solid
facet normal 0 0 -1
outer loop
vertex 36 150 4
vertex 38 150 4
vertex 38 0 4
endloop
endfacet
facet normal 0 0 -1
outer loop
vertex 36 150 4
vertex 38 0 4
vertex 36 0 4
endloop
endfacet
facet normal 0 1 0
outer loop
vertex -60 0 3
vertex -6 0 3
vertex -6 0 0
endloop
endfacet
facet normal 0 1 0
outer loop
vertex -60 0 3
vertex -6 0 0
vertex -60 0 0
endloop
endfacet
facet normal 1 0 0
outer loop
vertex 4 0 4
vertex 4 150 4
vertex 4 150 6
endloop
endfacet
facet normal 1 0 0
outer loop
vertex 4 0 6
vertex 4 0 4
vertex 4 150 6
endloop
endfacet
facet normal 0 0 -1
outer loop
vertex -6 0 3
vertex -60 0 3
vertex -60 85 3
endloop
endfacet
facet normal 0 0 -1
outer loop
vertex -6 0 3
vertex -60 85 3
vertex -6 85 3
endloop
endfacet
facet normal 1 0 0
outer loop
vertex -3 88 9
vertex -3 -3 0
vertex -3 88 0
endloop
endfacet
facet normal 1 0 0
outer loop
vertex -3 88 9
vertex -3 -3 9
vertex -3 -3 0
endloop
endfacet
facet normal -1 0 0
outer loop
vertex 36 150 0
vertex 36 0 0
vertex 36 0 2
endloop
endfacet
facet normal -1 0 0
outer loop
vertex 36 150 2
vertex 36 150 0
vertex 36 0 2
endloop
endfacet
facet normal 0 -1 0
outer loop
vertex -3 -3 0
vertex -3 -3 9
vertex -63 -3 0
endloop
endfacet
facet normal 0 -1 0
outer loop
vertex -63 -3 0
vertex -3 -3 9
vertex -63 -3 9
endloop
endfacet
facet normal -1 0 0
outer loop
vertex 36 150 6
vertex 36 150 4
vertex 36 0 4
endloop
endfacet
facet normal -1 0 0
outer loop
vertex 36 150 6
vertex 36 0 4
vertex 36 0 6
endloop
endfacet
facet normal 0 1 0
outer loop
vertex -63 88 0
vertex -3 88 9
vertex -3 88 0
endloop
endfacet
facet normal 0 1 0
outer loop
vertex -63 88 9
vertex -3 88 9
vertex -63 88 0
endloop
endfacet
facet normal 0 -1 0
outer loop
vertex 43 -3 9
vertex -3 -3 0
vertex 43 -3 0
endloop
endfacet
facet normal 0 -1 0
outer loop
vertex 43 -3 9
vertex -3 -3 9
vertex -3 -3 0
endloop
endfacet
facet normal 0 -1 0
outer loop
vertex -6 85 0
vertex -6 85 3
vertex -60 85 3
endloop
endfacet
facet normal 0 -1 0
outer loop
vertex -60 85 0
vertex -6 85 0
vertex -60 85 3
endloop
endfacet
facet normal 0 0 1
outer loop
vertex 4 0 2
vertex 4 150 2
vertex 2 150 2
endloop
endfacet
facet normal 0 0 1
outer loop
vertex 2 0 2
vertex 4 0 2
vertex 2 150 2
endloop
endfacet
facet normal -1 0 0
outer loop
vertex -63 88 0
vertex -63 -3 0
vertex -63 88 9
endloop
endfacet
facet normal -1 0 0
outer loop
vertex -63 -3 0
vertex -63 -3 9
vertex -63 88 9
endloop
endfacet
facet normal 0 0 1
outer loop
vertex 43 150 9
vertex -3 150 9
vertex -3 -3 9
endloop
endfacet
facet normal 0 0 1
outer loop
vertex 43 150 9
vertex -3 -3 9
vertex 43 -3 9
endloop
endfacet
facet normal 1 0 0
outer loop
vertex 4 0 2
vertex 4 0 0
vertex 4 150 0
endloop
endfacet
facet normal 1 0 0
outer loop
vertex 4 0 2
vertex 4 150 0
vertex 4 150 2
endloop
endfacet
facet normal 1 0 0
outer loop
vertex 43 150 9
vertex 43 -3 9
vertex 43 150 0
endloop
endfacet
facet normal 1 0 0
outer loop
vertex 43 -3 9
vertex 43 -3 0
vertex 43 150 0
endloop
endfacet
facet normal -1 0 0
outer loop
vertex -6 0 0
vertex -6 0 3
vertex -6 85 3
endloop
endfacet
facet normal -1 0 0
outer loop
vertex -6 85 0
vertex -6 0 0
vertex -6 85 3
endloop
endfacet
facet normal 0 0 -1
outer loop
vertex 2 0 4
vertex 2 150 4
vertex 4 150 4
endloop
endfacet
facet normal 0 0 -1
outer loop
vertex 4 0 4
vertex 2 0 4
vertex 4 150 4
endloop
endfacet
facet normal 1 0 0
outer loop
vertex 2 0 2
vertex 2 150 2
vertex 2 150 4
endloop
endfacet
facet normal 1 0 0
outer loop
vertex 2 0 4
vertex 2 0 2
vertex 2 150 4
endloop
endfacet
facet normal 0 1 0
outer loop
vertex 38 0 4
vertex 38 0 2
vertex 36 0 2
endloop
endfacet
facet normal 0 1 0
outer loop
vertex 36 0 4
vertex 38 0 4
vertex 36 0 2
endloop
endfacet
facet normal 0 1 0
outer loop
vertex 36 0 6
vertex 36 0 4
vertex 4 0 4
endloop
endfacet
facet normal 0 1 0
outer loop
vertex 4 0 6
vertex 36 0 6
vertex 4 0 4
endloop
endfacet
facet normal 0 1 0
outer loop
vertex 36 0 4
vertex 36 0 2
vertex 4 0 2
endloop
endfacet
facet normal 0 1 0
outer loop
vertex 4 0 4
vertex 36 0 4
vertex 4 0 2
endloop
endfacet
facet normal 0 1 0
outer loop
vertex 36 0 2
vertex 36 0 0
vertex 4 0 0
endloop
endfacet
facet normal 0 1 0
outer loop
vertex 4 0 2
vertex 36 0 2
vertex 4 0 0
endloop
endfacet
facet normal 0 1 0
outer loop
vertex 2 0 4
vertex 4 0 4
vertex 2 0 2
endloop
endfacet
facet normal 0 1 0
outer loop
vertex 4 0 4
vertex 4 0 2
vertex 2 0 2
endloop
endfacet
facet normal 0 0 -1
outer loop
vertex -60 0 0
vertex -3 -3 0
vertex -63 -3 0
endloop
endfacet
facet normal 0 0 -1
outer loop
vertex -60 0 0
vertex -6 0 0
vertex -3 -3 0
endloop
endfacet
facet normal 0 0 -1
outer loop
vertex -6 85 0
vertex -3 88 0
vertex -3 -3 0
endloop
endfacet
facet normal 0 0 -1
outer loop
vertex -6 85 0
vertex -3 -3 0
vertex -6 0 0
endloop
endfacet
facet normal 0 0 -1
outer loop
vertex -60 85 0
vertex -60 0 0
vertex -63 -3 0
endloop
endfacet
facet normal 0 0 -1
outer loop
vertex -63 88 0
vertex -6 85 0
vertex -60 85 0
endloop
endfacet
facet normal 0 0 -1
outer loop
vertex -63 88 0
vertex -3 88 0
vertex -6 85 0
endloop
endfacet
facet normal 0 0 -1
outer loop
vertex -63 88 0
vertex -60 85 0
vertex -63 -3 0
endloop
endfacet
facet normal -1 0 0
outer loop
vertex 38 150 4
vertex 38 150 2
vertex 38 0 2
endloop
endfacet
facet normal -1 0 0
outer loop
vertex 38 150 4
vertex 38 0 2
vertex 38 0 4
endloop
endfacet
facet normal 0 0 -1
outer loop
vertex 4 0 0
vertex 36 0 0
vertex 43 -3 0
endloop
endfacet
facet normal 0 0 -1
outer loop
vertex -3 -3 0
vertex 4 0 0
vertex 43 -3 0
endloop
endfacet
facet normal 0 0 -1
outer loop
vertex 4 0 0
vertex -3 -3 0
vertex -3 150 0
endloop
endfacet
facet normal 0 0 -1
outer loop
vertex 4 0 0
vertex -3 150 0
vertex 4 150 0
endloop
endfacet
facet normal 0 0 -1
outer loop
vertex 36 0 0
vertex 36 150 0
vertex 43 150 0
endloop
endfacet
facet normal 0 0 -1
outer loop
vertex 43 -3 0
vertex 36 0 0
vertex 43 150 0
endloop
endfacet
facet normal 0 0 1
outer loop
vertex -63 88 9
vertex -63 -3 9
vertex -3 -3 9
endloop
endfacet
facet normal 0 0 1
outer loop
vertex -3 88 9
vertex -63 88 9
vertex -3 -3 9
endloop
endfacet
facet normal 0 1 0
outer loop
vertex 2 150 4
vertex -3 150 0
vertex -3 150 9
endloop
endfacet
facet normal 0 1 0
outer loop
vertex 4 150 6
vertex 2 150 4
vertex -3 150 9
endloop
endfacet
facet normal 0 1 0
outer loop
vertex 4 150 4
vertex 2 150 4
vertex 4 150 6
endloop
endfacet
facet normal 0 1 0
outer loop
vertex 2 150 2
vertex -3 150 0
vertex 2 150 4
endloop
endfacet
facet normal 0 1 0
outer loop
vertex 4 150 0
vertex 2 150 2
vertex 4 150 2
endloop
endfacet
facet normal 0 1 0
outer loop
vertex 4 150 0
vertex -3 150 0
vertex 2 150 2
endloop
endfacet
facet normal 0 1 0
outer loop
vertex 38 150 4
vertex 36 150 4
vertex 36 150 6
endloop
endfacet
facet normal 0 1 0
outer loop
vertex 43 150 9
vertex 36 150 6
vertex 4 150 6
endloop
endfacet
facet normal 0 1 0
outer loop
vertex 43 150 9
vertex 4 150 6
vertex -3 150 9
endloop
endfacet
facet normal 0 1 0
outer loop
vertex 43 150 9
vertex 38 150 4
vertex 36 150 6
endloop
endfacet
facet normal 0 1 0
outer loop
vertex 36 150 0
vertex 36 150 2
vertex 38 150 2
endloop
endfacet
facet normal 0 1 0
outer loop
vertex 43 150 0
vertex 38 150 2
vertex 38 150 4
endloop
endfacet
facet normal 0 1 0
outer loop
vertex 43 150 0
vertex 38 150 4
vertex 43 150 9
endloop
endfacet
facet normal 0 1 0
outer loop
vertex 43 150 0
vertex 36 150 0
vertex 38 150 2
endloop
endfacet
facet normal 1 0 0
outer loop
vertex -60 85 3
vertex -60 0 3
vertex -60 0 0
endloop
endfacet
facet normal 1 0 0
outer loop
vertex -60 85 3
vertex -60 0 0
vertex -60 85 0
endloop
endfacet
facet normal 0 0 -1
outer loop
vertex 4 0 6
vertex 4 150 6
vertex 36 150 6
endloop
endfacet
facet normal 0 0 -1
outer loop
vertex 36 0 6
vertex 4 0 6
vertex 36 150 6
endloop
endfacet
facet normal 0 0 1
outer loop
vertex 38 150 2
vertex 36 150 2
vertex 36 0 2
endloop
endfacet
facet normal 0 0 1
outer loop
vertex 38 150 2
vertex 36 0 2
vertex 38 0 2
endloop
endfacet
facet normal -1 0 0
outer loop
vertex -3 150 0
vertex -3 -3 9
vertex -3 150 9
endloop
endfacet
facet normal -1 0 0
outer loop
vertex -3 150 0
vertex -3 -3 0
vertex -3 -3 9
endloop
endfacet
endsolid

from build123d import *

# Parameters (mm, degrees)
P_IDAT_VYSUNUT_M1_DEPTH = 6
SKICA2_W                = 46
SKICA2_H                = 153
P_IDAT_VYSUNUT_M2_DEPTH = 3
SKICA5_W                = 60
SKICA5_H                = 91
P_IDAT_VYSUNUT_M4_DEPTH = 6
SKICA7_W                = 60
SKICA7_H                = 91
SKICA7_W_2              = 54
SKICA7_H_2              = 85
P_IDAT_VYSUNUT_M5_DEPTH = 3
P_IDAT_VYSUNUT_M6_DEPTH = 153


with BuildPart() as part:
    # Skica1 → Přidat vysunutím1 (new body)
    with BuildSketch(Plane.XY):
        Polygon((40, -3), (43, -3), (43, 150), (40, 150), (40, 0), (0, 0), (0, 150), (-3, 150), (-3, -3), (0, -3), align=None)
    extrude(amount=P_IDAT_VYSUNUT_M1_DEPTH)

    # Skica2 → Přidat vysunutím2 (add)
    with BuildSketch(Plane.XY.offset(6)):
        with Locations((20, 73.5)):
            Rectangle(SKICA2_W, SKICA2_H)
    extrude(amount=P_IDAT_VYSUNUT_M2_DEPTH)

    # Skica3 → Přidat vysunutím6 (add, through all)
    with BuildSketch(Plane.XZ.offset(3)):
        Polygon((0, 0), (4, 0), (4, 2), (2, 2), (2, 4), (4, 4), (4, 6), (0, 6), align=None)
        Polygon((40, 0), (36, 0), (36, 2), (38, 2), (38, 4), (36, 4), (36, 6), (40, 6), align=None)
    extrude(amount=-P_IDAT_VYSUNUT_M6_DEPTH)


with BuildPart() as body_2:
    # Skica5 → Přidat vysunutím4 (new body)
    with BuildSketch(Plane.XY.offset(9)):
        with Locations((-33, 42.5)):
            Rectangle(SKICA5_W, SKICA5_H)
    extrude(amount=-P_IDAT_VYSUNUT_M4_DEPTH)

    # Skica7 → Přidat vysunutím5 (add, through all)
    with BuildSketch(Plane(origin=(0, 0, 3), x_dir=(-1, 0, 0), z_dir=(0, 0, -1))):
        with Locations((33, 42.5)):
            Rectangle(SKICA7_W, SKICA7_H)
        with Locations((33, 42.5)):
            Rectangle(SKICA7_W_2, SKICA7_H_2, mode=Mode.SUBTRACT)
    extrude(amount=P_IDAT_VYSUNUT_M5_DEPTH)


solid = Compound([part.part, body_2.part])
